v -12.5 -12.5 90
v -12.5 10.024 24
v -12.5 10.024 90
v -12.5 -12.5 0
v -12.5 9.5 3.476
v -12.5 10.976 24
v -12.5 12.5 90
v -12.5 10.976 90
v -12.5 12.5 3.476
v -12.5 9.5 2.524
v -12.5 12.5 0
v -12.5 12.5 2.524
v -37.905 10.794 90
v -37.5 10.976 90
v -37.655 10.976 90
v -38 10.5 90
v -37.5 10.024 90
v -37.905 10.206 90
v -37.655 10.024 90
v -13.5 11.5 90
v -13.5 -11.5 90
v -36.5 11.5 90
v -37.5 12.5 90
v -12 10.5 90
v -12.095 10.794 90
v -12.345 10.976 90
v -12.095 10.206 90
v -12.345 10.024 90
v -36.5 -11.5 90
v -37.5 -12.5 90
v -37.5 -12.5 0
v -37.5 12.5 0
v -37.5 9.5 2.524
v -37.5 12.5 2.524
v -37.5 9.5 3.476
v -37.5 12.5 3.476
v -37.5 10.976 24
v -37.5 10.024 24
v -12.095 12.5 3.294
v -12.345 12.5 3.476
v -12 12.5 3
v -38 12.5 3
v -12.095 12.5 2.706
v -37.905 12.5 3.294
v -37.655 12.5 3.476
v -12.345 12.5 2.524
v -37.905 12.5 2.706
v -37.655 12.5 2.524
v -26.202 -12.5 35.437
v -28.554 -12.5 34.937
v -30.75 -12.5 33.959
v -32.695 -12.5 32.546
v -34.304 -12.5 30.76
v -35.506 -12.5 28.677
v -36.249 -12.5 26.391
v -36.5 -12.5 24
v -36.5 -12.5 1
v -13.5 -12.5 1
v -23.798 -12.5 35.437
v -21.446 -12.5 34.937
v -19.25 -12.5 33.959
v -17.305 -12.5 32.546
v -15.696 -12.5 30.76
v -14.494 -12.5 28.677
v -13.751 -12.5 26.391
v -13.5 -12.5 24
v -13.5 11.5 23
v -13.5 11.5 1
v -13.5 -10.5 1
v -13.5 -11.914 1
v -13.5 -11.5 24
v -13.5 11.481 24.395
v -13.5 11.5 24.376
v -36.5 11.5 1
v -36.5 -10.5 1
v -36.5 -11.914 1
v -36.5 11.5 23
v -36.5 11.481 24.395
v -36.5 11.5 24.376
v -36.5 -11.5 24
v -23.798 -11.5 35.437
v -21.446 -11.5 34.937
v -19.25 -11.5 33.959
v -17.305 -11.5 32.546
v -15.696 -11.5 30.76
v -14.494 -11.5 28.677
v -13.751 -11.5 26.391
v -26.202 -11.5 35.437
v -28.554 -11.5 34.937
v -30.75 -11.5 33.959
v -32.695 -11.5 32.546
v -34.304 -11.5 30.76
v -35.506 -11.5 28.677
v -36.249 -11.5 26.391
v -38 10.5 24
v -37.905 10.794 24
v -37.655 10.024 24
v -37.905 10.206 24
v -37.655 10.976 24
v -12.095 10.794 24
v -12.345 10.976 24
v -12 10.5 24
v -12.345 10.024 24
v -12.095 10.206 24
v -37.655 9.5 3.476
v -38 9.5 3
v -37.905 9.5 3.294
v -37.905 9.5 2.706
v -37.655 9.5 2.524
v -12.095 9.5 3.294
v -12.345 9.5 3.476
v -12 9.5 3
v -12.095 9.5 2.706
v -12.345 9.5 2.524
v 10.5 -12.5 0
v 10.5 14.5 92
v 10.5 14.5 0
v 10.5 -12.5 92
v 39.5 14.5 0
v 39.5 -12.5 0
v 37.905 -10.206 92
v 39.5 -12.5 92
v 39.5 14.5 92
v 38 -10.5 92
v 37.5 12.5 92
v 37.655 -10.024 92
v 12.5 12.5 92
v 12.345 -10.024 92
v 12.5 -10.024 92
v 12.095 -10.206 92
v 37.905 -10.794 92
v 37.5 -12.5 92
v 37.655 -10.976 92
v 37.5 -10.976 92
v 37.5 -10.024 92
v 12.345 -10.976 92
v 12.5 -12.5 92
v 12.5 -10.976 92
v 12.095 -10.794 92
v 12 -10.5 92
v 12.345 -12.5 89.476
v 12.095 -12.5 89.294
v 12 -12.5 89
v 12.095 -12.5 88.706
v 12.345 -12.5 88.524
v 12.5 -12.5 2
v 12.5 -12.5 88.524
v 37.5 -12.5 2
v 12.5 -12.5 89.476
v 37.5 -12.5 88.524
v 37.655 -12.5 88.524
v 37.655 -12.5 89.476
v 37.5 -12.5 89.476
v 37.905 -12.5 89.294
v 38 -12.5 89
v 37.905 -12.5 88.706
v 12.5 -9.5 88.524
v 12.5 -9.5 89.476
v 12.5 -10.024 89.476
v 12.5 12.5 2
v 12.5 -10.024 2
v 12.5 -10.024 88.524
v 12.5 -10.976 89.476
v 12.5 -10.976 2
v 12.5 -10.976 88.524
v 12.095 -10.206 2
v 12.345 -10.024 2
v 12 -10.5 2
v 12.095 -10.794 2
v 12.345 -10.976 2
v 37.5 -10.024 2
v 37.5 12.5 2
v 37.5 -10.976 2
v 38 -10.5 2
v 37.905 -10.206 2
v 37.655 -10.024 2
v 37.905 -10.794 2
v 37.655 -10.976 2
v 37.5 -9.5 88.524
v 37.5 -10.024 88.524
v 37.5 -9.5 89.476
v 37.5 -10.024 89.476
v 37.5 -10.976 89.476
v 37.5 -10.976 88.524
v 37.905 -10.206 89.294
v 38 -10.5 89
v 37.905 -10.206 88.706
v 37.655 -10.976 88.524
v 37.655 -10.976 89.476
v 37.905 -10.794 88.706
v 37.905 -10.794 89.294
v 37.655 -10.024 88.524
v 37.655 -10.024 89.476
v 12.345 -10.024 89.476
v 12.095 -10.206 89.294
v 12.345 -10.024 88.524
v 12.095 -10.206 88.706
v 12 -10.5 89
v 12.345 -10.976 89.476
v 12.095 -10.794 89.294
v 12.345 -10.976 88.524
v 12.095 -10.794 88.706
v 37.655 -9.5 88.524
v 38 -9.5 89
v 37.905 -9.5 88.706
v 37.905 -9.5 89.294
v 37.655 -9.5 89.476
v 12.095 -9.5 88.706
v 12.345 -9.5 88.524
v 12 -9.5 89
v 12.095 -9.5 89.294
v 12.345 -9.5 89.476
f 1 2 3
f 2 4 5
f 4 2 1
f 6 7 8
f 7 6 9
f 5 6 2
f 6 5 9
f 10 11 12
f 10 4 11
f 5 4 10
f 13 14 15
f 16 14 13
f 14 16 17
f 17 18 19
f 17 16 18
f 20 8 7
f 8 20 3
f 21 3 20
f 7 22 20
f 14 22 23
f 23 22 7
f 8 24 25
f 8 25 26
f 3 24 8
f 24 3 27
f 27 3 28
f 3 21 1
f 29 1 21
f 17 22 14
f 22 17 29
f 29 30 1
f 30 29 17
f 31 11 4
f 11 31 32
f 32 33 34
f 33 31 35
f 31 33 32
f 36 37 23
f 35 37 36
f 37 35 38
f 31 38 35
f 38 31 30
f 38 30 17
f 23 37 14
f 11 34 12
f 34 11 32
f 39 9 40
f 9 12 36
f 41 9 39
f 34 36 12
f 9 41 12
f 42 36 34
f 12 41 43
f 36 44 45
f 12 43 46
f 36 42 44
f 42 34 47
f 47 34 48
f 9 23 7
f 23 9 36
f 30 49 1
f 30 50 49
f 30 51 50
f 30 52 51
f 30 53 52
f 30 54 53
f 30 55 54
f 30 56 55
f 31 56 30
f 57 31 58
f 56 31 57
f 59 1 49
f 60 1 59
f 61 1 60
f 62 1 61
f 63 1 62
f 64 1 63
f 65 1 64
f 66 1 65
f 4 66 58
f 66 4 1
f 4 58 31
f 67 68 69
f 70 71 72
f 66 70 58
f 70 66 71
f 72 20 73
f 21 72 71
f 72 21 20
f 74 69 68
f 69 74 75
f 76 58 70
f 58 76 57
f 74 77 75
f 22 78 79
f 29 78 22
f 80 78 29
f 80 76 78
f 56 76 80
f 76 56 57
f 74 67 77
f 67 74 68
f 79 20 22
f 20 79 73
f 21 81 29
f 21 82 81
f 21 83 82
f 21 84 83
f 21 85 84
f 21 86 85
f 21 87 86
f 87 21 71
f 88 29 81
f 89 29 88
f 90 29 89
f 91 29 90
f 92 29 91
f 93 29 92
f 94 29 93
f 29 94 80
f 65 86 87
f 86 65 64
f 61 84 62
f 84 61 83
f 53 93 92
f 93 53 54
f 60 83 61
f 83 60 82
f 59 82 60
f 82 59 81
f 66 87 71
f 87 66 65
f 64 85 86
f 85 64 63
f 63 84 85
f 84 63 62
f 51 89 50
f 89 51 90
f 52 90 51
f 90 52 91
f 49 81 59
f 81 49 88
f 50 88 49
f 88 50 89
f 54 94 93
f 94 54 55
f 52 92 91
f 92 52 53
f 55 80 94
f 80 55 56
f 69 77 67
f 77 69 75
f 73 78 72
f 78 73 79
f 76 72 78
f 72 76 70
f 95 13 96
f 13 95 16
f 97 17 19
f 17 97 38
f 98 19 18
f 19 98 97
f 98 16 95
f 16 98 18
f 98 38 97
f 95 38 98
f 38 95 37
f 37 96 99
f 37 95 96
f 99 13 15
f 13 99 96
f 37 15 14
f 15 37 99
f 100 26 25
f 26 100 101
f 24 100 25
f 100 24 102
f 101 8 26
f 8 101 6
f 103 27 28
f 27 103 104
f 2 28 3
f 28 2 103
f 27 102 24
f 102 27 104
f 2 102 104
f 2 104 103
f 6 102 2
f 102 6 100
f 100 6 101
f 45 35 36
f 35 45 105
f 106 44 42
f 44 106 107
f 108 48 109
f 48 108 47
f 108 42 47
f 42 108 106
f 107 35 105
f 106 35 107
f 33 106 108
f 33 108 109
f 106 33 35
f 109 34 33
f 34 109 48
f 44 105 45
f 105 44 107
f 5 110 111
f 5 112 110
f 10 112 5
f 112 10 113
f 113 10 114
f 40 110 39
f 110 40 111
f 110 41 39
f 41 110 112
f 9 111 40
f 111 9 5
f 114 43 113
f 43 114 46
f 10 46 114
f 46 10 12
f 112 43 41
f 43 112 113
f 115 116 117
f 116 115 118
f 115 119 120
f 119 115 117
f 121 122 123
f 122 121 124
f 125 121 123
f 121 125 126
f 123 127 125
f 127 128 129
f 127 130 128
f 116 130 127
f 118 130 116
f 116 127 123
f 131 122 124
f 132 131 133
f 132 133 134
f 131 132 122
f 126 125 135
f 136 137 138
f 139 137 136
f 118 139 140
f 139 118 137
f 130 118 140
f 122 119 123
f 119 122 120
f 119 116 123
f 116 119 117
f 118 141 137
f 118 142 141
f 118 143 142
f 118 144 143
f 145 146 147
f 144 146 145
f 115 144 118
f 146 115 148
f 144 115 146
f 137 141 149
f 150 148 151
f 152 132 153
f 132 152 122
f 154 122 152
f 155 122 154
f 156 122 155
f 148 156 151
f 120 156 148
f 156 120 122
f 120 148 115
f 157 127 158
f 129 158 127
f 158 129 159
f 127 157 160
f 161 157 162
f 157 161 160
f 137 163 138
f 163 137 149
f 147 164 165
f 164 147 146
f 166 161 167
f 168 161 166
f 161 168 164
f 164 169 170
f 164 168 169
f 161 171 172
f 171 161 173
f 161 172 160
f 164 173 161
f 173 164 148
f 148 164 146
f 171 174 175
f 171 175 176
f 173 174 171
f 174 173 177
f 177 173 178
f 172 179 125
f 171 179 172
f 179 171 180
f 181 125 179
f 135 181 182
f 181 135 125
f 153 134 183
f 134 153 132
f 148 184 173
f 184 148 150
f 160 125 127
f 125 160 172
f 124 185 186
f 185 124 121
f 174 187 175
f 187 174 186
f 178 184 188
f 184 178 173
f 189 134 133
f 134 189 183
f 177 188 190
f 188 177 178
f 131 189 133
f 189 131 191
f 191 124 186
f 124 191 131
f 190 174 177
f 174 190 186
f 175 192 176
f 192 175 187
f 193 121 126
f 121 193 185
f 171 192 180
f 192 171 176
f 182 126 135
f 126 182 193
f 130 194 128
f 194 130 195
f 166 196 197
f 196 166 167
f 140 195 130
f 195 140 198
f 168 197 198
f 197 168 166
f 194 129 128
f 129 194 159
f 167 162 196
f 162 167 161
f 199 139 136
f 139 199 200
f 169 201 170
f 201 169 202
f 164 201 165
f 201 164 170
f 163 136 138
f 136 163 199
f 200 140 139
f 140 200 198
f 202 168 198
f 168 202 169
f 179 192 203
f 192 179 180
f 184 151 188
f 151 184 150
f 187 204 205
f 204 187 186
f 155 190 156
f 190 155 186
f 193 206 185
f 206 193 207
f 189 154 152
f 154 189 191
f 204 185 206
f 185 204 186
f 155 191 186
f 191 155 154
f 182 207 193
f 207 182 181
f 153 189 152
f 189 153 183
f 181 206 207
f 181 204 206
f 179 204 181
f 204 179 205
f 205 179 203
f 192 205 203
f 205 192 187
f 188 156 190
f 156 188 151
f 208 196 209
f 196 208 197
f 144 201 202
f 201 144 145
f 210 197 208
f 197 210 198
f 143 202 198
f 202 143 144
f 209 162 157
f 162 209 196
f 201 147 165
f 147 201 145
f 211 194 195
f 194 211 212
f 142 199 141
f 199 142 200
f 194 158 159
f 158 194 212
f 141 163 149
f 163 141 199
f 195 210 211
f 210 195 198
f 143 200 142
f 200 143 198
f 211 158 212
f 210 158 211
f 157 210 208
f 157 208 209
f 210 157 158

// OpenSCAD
width=25;
depth=25;
height=90;
wall_depth=1;

translate([-width*1.5,-depth/2,0]){
 union(){
  difference(){
   //Build the general tube
   difference() {
    cube([width,depth,height]);
    translate([wall_depth, wall_depth,wall_depth]){
     cube([width-2*wall_depth, depth-2*wall_depth, height]);
    }
   }

   //The opening at the bottom:
   translate([width/2,-1,width-1]){
    rotate([-90,0,0]){
     union() {
      cylinder(h=wall_depth+2, r=width/2-wall_depth);
      translate([-1*(width/2-wall_depth),0,0]){
       cube([width-wall_depth*2, width-wall_depth*2, wall_depth+2]);
      }
     }
    }
   }
  }

  //Output Ramp:
  translate([0,1,0]){
   rotate([45,0,0]){
    color("blue") cube([width, floor(sqrt((depth*depth)*2))-1.5, 1]);
   }
  }

 //Cover rails
  translate([0,width-wall_depth*2,depth-wall_depth]){
   cylinder(h=height-depth+wall_depth, r=wall_depth/2,$fn=10);
  }
  translate([width,width-wall_depth*2,depth-wall_depth]){
   cylinder(h=height-depth+wall_depth, r=wall_depth/2,$fn=10);
  }  

  translate([0,width,wall_depth*3]){
   rotate([90,0,0]){
    cylinder(h=wall_depth*3, r=wall_depth/2, $fn=10);
   }
  }
  translate([width,width,wall_depth*3]){
   rotate([90,0,0]){
    cylinder(h=wall_depth*3, r=wall_depth/2, $fn=10);
   }
  }
 }
}
//cover
translate([width*1.5,-1*wall_depth-depth/2,height+wall_depth*2]){
 color("red")
 rotate([0,180,0])
 difference(){
  translate([-2*wall_depth,wall_depth,0]){
   cube([width+wall_depth*4,depth+wall_depth*2,height+wall_depth*2]);
  }
  translate([0,0,-1]){
   cube([width,depth+wall_depth,height+1]);
  }
 
  //cover Slides
  translate([0,wall_depth*3,0]){
   cylinder(h=height, r=wall_depth/2,$fn=10);
  }
  translate([width,wall_depth*3,0]){
   cylinder(h=height, r=wall_depth/2,$fn=10);
  }

  translate([0,wall_depth*4,wall_depth*3]){
   rotate([90,0,0]){
    cylinder(h=wall_depth*4, r=wall_depth/2, $fn=10);
   }
  }
  translate([width,wall_depth*4,wall_depth*3]){
   rotate([90,0,0]){
    cylinder(h=wall_depth*4, r=wall_depth/2, $fn=10);
   }
  }
 }
}
